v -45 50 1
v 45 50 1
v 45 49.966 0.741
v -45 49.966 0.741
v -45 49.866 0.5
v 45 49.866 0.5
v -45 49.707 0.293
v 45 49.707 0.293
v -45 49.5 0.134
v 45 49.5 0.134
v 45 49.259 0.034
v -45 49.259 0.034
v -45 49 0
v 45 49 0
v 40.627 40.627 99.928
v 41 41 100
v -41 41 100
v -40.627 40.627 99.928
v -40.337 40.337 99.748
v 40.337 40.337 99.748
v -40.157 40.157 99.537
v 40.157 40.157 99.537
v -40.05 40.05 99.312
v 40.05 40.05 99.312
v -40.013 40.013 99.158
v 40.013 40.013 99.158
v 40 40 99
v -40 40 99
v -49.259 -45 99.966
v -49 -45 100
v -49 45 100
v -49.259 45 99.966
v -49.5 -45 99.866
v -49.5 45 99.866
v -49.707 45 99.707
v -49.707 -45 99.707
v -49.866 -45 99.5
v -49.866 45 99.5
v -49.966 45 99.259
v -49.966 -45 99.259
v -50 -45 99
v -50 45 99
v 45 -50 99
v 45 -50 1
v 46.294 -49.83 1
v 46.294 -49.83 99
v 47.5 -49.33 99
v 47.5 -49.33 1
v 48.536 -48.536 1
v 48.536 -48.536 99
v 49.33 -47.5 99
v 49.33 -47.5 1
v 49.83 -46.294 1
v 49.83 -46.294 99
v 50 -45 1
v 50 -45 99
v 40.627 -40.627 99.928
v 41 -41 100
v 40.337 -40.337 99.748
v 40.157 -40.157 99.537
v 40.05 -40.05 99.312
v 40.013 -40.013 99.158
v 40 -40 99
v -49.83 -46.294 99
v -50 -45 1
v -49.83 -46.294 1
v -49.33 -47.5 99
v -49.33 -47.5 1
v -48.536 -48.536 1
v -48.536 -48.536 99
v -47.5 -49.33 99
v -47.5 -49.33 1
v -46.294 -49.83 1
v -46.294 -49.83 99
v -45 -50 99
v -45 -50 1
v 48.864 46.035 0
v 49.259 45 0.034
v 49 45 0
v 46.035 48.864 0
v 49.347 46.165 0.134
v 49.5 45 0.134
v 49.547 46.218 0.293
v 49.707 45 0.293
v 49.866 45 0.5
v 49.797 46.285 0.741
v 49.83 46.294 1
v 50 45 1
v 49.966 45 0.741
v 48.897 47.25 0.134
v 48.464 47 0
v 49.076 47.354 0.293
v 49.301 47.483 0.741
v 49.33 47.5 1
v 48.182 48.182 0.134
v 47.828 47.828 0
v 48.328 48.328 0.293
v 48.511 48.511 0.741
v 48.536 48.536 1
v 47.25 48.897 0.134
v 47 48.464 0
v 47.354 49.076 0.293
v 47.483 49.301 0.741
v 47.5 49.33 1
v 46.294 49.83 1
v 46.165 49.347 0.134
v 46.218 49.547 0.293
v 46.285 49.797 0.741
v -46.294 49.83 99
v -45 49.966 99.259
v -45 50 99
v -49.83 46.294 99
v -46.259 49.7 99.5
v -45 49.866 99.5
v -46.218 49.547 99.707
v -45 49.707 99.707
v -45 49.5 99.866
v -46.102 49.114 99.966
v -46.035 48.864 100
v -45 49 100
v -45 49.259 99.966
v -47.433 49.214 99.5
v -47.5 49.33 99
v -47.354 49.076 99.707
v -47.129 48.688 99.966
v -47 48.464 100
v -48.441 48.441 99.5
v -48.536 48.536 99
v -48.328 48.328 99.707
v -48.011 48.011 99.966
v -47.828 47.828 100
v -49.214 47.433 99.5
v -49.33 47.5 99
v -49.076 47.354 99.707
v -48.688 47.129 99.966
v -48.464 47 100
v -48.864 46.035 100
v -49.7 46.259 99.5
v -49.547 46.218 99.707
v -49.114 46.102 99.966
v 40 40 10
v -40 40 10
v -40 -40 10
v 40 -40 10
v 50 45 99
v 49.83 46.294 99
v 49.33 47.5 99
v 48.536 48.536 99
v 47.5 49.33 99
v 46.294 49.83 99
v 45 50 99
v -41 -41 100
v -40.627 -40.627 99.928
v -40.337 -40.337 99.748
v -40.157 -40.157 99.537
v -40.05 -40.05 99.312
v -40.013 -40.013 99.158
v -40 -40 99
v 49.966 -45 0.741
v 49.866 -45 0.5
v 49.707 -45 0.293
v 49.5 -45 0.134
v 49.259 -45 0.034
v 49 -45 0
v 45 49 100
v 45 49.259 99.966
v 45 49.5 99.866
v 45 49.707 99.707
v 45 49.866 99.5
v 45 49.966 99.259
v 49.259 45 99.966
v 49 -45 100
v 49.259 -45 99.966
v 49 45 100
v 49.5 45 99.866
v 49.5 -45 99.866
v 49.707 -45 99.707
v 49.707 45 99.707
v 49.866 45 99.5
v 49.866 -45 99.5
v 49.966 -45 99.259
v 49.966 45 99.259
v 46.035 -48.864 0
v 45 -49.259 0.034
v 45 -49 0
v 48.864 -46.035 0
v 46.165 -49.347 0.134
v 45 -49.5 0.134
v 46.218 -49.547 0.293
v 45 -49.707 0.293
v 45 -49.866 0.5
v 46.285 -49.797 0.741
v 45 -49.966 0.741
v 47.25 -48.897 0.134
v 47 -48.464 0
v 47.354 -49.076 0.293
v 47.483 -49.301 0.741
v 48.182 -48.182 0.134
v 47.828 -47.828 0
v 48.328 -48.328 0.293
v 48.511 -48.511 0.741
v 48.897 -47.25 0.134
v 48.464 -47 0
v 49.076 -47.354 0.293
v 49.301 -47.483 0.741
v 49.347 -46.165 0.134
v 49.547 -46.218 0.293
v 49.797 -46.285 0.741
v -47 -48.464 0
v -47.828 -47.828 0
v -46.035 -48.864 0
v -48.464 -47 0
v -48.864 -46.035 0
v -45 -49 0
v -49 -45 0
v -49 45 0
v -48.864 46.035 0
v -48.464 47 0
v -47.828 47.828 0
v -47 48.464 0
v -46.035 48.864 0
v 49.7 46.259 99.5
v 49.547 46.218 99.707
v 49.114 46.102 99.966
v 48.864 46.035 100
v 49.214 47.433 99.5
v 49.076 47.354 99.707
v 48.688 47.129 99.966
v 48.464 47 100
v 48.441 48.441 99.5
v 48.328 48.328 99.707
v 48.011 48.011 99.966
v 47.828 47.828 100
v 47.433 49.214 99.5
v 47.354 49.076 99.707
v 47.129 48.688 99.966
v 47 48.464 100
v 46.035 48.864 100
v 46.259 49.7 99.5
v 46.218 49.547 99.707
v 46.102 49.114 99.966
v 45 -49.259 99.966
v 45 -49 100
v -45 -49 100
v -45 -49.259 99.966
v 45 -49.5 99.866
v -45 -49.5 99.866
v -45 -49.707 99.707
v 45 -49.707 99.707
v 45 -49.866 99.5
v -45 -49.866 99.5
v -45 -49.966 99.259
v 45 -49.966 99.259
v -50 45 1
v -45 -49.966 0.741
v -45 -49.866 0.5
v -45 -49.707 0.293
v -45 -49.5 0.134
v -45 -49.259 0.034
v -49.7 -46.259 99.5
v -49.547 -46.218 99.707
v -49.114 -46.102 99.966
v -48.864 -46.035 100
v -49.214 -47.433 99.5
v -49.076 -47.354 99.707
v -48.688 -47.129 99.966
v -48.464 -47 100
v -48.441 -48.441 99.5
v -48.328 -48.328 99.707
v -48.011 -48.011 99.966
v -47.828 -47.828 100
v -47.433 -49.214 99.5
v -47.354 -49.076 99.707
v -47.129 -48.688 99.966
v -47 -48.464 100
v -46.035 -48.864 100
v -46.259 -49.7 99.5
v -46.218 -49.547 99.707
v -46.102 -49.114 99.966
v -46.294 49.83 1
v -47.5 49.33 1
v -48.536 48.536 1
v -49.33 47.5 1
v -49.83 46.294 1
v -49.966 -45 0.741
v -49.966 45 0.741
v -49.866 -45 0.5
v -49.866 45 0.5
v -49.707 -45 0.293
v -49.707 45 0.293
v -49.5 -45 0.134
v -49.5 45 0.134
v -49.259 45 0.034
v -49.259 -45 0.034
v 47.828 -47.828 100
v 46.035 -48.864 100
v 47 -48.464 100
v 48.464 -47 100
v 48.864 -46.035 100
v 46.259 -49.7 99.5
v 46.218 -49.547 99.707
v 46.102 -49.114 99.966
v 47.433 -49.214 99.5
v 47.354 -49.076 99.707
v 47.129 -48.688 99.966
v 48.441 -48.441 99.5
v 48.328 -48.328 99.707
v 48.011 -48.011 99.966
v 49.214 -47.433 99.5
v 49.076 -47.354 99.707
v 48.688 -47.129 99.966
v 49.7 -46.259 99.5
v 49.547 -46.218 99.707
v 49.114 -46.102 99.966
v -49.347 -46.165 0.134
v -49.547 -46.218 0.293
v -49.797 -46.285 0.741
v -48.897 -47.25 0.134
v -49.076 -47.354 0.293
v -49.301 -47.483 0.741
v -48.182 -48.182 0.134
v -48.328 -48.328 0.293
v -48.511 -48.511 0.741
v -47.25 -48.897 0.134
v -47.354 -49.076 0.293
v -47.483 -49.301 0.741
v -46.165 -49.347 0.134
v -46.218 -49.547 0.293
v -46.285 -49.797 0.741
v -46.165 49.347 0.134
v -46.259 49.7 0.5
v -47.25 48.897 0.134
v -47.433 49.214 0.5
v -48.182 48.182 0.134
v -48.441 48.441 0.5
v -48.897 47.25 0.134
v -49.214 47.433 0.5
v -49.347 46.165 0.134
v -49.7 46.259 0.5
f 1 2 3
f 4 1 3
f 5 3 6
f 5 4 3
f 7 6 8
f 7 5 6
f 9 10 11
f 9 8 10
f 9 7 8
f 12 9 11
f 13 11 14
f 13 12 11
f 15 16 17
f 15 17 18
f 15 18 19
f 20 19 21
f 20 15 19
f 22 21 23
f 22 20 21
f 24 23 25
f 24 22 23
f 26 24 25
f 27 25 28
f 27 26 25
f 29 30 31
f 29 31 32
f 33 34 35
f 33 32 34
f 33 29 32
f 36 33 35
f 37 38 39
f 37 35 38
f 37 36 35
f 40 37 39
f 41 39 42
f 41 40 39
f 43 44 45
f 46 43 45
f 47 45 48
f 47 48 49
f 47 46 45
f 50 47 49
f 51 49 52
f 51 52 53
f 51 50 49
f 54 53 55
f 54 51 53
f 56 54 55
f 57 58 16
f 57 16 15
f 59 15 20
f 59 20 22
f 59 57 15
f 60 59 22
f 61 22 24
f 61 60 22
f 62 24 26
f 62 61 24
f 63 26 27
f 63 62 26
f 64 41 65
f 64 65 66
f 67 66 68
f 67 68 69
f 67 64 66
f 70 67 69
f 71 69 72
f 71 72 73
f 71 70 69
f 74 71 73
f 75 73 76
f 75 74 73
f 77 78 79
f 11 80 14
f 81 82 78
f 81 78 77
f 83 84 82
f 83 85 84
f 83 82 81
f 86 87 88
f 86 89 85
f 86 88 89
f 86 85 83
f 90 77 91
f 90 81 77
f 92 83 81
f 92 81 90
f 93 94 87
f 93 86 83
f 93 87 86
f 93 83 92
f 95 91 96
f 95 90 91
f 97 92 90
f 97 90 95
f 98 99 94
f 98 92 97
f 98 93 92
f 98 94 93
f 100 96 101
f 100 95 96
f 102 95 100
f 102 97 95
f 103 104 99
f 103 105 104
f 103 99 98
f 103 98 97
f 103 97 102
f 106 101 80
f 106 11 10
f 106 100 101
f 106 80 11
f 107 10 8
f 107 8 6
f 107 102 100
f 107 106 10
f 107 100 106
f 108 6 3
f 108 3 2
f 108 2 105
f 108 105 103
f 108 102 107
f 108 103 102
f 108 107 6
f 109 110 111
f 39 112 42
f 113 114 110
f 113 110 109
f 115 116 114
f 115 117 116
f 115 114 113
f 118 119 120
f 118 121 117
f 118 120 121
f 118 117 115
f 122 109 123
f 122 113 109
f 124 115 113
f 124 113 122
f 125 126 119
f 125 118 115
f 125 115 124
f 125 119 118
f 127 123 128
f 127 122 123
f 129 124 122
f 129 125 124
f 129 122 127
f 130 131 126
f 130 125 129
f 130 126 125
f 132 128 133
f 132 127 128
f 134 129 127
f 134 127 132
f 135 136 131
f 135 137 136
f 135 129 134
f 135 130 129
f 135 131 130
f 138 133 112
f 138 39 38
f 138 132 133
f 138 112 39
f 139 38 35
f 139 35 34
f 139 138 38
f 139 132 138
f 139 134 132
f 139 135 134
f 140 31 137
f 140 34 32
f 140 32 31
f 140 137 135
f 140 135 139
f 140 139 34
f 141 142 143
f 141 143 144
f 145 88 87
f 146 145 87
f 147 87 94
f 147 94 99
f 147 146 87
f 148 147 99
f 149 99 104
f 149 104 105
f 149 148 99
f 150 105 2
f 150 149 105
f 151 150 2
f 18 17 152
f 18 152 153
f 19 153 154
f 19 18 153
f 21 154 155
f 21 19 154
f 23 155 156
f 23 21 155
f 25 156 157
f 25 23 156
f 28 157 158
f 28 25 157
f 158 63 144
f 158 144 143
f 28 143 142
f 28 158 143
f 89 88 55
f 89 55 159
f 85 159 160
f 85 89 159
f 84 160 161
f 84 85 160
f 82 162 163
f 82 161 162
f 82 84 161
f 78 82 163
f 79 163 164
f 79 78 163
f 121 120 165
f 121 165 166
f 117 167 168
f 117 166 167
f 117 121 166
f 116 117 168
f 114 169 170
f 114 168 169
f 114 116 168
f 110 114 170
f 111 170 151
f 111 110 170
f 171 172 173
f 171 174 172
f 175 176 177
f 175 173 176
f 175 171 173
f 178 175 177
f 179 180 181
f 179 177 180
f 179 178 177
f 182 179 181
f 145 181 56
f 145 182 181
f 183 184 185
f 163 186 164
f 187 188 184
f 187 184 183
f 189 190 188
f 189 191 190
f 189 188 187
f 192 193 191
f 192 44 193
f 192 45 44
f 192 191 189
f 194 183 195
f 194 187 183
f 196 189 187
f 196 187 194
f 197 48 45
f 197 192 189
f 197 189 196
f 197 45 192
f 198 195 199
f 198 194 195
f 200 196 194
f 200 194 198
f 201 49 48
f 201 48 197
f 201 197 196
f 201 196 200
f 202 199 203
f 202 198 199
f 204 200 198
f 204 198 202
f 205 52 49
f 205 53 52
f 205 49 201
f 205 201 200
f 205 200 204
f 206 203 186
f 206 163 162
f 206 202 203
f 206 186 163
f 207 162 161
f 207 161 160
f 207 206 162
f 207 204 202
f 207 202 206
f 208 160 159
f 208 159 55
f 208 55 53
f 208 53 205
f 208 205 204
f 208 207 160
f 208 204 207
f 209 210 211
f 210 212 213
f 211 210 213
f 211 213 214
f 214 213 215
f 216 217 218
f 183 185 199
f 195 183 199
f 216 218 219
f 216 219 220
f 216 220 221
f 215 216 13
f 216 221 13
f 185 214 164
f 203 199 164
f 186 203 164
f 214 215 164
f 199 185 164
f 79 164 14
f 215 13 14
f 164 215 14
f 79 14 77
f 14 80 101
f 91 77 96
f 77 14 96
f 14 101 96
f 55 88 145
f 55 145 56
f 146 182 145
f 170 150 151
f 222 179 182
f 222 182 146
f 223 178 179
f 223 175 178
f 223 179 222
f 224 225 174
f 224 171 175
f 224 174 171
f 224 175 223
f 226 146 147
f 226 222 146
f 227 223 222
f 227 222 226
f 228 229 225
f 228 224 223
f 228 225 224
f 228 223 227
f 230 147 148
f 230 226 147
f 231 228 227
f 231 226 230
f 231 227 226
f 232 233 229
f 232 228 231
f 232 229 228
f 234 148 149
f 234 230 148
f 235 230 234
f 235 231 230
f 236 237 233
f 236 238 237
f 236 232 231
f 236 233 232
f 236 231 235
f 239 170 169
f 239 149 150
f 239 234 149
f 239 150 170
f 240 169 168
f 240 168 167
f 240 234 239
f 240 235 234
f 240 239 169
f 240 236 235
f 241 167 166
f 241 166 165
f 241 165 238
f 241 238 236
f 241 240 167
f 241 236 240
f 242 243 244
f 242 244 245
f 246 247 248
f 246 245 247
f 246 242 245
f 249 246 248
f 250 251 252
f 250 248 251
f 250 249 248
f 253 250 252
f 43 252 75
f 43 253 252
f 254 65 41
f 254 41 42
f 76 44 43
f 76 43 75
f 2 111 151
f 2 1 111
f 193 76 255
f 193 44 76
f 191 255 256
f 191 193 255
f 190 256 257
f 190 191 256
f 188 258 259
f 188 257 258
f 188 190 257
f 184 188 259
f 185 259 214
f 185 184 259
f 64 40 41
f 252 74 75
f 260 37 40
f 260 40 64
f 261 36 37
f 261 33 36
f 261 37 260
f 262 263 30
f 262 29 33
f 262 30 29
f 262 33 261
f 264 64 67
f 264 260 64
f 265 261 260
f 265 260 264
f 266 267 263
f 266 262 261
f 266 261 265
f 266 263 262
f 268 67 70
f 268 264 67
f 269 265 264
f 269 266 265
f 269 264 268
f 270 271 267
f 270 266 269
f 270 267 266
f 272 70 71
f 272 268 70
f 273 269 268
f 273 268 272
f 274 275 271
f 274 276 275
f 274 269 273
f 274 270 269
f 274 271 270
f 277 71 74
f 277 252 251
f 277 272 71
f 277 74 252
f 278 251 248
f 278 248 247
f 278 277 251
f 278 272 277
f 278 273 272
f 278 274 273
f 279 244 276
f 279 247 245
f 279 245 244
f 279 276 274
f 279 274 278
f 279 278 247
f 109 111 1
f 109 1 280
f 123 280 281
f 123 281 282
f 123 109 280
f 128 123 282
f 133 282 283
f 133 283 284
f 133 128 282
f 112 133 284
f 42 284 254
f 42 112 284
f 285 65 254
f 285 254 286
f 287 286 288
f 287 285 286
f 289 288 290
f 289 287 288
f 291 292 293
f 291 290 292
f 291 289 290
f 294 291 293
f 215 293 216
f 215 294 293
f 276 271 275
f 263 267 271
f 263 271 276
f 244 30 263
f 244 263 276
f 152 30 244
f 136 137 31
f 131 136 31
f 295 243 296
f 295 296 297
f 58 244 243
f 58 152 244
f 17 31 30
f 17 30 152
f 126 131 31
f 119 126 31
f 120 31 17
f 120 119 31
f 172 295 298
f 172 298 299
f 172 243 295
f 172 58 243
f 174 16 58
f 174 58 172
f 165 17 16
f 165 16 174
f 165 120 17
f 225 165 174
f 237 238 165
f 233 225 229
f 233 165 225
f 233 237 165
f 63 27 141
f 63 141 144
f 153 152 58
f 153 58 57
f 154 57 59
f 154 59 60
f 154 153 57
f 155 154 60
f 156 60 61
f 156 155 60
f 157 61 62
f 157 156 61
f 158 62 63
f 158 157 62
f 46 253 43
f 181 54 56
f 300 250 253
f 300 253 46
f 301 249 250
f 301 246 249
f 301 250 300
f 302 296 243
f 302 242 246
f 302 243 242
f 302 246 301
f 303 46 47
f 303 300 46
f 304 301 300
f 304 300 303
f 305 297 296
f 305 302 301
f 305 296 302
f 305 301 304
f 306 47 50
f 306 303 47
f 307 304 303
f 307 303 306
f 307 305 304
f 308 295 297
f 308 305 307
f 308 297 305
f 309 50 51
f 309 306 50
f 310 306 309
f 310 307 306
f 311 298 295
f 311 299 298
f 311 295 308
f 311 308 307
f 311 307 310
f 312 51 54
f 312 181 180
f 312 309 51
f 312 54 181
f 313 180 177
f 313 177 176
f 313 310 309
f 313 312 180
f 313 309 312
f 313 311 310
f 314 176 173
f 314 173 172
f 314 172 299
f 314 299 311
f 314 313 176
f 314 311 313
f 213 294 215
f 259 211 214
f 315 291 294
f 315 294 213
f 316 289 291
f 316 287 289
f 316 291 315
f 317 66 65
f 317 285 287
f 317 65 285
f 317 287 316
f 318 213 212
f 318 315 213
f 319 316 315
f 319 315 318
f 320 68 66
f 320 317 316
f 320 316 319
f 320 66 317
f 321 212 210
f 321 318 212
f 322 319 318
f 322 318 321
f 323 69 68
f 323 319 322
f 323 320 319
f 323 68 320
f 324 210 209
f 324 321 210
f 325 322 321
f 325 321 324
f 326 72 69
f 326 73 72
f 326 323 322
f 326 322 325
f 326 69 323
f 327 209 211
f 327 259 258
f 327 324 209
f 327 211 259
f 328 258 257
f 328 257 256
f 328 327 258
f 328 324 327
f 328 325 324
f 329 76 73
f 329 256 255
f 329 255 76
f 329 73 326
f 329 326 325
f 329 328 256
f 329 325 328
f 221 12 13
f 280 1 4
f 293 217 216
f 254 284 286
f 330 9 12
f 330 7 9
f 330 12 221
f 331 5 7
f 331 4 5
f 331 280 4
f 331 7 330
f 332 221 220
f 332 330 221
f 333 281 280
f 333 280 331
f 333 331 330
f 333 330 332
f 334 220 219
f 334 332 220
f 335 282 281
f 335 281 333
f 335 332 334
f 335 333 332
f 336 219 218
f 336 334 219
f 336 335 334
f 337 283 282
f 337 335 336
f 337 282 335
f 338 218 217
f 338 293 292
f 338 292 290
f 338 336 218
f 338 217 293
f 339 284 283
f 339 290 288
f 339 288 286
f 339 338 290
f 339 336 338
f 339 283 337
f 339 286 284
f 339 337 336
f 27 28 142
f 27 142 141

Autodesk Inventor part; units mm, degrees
ref_plane "YZ Plane" through (0, 0, 0) normal (1, 0, 0) x (0, 1, 0)
ref_plane "XZ Plane" through (0, 0, 0) normal (0, 1, 0) x (-1, 0, 0)
ref_plane "XY Plane" through (0, 0, 0) normal (0, 0, 1) x (1, 0, 0)
sketch "草圖1" plane through (0, 0, 0) normal (0, 0, 1) x (1, 0, 0)
  line L0 (-50, 50) -> (50, 50)
  line L1 (50, 50) -> (50, -50)
  line L2 (50, -50) -> (-50, -50)
  line L3 (-50, -50) -> (-50, 50)
  point P0 (0, 0)
  dimension "d0" = 100
  dimension "d1" = 100
  dimension "d2" = 50
  dimension "d3" = 50
extrude "擠出1" add sketch "草圖1" along normal blind 100
sketch "草圖2" plane through (0, 0, 100) normal (0, 0, 1) x (1, 0, 0)
  line L0 (-40, 40) -> (40, 40)
  line L1 (40, 40) -> (40, -40)
  line L2 (40, -40) -> (-40, -40)
  line L3 (-40, -40) -> (-40, 40)
  point P0 (0, 0)
  dimension "d6" = 80
  dimension "d7" = 80
  dimension "d8" = 40
  dimension "d9" = 40
extrude "擠出2" cut sketch "草圖2" against normal blind 90
fillet "圓角1" radius 5 4 edges at (-50, -50, 50) (50, -50, 50) (50, 50, 50) (-50, 50, 50)
fillet "圓角2" radius 1 20 edges at (-48.5355, 48.5355, 100) (-50, 0, 100) (-48.5355, -48.5355, 100) (0, -50, 100) (48.5355, -48.5355, 100) (50, 0, 100) (48.5355, 48.5355, 100) (0, 50, 100) (0, 40, 100) (40, 0, 100) (0, -40, 100) (-40, 0, 100) (-48.5355, 48.5355, 0) (0, 50, 0) (48.5355, 48.5355, 0) (50, 0, 0) (48.5355, -48.5355, 0) (0, -50, 0) (-48.5355, -48.5355, 0) (-50, 0, 0)
properties part number "遙控器盒"
